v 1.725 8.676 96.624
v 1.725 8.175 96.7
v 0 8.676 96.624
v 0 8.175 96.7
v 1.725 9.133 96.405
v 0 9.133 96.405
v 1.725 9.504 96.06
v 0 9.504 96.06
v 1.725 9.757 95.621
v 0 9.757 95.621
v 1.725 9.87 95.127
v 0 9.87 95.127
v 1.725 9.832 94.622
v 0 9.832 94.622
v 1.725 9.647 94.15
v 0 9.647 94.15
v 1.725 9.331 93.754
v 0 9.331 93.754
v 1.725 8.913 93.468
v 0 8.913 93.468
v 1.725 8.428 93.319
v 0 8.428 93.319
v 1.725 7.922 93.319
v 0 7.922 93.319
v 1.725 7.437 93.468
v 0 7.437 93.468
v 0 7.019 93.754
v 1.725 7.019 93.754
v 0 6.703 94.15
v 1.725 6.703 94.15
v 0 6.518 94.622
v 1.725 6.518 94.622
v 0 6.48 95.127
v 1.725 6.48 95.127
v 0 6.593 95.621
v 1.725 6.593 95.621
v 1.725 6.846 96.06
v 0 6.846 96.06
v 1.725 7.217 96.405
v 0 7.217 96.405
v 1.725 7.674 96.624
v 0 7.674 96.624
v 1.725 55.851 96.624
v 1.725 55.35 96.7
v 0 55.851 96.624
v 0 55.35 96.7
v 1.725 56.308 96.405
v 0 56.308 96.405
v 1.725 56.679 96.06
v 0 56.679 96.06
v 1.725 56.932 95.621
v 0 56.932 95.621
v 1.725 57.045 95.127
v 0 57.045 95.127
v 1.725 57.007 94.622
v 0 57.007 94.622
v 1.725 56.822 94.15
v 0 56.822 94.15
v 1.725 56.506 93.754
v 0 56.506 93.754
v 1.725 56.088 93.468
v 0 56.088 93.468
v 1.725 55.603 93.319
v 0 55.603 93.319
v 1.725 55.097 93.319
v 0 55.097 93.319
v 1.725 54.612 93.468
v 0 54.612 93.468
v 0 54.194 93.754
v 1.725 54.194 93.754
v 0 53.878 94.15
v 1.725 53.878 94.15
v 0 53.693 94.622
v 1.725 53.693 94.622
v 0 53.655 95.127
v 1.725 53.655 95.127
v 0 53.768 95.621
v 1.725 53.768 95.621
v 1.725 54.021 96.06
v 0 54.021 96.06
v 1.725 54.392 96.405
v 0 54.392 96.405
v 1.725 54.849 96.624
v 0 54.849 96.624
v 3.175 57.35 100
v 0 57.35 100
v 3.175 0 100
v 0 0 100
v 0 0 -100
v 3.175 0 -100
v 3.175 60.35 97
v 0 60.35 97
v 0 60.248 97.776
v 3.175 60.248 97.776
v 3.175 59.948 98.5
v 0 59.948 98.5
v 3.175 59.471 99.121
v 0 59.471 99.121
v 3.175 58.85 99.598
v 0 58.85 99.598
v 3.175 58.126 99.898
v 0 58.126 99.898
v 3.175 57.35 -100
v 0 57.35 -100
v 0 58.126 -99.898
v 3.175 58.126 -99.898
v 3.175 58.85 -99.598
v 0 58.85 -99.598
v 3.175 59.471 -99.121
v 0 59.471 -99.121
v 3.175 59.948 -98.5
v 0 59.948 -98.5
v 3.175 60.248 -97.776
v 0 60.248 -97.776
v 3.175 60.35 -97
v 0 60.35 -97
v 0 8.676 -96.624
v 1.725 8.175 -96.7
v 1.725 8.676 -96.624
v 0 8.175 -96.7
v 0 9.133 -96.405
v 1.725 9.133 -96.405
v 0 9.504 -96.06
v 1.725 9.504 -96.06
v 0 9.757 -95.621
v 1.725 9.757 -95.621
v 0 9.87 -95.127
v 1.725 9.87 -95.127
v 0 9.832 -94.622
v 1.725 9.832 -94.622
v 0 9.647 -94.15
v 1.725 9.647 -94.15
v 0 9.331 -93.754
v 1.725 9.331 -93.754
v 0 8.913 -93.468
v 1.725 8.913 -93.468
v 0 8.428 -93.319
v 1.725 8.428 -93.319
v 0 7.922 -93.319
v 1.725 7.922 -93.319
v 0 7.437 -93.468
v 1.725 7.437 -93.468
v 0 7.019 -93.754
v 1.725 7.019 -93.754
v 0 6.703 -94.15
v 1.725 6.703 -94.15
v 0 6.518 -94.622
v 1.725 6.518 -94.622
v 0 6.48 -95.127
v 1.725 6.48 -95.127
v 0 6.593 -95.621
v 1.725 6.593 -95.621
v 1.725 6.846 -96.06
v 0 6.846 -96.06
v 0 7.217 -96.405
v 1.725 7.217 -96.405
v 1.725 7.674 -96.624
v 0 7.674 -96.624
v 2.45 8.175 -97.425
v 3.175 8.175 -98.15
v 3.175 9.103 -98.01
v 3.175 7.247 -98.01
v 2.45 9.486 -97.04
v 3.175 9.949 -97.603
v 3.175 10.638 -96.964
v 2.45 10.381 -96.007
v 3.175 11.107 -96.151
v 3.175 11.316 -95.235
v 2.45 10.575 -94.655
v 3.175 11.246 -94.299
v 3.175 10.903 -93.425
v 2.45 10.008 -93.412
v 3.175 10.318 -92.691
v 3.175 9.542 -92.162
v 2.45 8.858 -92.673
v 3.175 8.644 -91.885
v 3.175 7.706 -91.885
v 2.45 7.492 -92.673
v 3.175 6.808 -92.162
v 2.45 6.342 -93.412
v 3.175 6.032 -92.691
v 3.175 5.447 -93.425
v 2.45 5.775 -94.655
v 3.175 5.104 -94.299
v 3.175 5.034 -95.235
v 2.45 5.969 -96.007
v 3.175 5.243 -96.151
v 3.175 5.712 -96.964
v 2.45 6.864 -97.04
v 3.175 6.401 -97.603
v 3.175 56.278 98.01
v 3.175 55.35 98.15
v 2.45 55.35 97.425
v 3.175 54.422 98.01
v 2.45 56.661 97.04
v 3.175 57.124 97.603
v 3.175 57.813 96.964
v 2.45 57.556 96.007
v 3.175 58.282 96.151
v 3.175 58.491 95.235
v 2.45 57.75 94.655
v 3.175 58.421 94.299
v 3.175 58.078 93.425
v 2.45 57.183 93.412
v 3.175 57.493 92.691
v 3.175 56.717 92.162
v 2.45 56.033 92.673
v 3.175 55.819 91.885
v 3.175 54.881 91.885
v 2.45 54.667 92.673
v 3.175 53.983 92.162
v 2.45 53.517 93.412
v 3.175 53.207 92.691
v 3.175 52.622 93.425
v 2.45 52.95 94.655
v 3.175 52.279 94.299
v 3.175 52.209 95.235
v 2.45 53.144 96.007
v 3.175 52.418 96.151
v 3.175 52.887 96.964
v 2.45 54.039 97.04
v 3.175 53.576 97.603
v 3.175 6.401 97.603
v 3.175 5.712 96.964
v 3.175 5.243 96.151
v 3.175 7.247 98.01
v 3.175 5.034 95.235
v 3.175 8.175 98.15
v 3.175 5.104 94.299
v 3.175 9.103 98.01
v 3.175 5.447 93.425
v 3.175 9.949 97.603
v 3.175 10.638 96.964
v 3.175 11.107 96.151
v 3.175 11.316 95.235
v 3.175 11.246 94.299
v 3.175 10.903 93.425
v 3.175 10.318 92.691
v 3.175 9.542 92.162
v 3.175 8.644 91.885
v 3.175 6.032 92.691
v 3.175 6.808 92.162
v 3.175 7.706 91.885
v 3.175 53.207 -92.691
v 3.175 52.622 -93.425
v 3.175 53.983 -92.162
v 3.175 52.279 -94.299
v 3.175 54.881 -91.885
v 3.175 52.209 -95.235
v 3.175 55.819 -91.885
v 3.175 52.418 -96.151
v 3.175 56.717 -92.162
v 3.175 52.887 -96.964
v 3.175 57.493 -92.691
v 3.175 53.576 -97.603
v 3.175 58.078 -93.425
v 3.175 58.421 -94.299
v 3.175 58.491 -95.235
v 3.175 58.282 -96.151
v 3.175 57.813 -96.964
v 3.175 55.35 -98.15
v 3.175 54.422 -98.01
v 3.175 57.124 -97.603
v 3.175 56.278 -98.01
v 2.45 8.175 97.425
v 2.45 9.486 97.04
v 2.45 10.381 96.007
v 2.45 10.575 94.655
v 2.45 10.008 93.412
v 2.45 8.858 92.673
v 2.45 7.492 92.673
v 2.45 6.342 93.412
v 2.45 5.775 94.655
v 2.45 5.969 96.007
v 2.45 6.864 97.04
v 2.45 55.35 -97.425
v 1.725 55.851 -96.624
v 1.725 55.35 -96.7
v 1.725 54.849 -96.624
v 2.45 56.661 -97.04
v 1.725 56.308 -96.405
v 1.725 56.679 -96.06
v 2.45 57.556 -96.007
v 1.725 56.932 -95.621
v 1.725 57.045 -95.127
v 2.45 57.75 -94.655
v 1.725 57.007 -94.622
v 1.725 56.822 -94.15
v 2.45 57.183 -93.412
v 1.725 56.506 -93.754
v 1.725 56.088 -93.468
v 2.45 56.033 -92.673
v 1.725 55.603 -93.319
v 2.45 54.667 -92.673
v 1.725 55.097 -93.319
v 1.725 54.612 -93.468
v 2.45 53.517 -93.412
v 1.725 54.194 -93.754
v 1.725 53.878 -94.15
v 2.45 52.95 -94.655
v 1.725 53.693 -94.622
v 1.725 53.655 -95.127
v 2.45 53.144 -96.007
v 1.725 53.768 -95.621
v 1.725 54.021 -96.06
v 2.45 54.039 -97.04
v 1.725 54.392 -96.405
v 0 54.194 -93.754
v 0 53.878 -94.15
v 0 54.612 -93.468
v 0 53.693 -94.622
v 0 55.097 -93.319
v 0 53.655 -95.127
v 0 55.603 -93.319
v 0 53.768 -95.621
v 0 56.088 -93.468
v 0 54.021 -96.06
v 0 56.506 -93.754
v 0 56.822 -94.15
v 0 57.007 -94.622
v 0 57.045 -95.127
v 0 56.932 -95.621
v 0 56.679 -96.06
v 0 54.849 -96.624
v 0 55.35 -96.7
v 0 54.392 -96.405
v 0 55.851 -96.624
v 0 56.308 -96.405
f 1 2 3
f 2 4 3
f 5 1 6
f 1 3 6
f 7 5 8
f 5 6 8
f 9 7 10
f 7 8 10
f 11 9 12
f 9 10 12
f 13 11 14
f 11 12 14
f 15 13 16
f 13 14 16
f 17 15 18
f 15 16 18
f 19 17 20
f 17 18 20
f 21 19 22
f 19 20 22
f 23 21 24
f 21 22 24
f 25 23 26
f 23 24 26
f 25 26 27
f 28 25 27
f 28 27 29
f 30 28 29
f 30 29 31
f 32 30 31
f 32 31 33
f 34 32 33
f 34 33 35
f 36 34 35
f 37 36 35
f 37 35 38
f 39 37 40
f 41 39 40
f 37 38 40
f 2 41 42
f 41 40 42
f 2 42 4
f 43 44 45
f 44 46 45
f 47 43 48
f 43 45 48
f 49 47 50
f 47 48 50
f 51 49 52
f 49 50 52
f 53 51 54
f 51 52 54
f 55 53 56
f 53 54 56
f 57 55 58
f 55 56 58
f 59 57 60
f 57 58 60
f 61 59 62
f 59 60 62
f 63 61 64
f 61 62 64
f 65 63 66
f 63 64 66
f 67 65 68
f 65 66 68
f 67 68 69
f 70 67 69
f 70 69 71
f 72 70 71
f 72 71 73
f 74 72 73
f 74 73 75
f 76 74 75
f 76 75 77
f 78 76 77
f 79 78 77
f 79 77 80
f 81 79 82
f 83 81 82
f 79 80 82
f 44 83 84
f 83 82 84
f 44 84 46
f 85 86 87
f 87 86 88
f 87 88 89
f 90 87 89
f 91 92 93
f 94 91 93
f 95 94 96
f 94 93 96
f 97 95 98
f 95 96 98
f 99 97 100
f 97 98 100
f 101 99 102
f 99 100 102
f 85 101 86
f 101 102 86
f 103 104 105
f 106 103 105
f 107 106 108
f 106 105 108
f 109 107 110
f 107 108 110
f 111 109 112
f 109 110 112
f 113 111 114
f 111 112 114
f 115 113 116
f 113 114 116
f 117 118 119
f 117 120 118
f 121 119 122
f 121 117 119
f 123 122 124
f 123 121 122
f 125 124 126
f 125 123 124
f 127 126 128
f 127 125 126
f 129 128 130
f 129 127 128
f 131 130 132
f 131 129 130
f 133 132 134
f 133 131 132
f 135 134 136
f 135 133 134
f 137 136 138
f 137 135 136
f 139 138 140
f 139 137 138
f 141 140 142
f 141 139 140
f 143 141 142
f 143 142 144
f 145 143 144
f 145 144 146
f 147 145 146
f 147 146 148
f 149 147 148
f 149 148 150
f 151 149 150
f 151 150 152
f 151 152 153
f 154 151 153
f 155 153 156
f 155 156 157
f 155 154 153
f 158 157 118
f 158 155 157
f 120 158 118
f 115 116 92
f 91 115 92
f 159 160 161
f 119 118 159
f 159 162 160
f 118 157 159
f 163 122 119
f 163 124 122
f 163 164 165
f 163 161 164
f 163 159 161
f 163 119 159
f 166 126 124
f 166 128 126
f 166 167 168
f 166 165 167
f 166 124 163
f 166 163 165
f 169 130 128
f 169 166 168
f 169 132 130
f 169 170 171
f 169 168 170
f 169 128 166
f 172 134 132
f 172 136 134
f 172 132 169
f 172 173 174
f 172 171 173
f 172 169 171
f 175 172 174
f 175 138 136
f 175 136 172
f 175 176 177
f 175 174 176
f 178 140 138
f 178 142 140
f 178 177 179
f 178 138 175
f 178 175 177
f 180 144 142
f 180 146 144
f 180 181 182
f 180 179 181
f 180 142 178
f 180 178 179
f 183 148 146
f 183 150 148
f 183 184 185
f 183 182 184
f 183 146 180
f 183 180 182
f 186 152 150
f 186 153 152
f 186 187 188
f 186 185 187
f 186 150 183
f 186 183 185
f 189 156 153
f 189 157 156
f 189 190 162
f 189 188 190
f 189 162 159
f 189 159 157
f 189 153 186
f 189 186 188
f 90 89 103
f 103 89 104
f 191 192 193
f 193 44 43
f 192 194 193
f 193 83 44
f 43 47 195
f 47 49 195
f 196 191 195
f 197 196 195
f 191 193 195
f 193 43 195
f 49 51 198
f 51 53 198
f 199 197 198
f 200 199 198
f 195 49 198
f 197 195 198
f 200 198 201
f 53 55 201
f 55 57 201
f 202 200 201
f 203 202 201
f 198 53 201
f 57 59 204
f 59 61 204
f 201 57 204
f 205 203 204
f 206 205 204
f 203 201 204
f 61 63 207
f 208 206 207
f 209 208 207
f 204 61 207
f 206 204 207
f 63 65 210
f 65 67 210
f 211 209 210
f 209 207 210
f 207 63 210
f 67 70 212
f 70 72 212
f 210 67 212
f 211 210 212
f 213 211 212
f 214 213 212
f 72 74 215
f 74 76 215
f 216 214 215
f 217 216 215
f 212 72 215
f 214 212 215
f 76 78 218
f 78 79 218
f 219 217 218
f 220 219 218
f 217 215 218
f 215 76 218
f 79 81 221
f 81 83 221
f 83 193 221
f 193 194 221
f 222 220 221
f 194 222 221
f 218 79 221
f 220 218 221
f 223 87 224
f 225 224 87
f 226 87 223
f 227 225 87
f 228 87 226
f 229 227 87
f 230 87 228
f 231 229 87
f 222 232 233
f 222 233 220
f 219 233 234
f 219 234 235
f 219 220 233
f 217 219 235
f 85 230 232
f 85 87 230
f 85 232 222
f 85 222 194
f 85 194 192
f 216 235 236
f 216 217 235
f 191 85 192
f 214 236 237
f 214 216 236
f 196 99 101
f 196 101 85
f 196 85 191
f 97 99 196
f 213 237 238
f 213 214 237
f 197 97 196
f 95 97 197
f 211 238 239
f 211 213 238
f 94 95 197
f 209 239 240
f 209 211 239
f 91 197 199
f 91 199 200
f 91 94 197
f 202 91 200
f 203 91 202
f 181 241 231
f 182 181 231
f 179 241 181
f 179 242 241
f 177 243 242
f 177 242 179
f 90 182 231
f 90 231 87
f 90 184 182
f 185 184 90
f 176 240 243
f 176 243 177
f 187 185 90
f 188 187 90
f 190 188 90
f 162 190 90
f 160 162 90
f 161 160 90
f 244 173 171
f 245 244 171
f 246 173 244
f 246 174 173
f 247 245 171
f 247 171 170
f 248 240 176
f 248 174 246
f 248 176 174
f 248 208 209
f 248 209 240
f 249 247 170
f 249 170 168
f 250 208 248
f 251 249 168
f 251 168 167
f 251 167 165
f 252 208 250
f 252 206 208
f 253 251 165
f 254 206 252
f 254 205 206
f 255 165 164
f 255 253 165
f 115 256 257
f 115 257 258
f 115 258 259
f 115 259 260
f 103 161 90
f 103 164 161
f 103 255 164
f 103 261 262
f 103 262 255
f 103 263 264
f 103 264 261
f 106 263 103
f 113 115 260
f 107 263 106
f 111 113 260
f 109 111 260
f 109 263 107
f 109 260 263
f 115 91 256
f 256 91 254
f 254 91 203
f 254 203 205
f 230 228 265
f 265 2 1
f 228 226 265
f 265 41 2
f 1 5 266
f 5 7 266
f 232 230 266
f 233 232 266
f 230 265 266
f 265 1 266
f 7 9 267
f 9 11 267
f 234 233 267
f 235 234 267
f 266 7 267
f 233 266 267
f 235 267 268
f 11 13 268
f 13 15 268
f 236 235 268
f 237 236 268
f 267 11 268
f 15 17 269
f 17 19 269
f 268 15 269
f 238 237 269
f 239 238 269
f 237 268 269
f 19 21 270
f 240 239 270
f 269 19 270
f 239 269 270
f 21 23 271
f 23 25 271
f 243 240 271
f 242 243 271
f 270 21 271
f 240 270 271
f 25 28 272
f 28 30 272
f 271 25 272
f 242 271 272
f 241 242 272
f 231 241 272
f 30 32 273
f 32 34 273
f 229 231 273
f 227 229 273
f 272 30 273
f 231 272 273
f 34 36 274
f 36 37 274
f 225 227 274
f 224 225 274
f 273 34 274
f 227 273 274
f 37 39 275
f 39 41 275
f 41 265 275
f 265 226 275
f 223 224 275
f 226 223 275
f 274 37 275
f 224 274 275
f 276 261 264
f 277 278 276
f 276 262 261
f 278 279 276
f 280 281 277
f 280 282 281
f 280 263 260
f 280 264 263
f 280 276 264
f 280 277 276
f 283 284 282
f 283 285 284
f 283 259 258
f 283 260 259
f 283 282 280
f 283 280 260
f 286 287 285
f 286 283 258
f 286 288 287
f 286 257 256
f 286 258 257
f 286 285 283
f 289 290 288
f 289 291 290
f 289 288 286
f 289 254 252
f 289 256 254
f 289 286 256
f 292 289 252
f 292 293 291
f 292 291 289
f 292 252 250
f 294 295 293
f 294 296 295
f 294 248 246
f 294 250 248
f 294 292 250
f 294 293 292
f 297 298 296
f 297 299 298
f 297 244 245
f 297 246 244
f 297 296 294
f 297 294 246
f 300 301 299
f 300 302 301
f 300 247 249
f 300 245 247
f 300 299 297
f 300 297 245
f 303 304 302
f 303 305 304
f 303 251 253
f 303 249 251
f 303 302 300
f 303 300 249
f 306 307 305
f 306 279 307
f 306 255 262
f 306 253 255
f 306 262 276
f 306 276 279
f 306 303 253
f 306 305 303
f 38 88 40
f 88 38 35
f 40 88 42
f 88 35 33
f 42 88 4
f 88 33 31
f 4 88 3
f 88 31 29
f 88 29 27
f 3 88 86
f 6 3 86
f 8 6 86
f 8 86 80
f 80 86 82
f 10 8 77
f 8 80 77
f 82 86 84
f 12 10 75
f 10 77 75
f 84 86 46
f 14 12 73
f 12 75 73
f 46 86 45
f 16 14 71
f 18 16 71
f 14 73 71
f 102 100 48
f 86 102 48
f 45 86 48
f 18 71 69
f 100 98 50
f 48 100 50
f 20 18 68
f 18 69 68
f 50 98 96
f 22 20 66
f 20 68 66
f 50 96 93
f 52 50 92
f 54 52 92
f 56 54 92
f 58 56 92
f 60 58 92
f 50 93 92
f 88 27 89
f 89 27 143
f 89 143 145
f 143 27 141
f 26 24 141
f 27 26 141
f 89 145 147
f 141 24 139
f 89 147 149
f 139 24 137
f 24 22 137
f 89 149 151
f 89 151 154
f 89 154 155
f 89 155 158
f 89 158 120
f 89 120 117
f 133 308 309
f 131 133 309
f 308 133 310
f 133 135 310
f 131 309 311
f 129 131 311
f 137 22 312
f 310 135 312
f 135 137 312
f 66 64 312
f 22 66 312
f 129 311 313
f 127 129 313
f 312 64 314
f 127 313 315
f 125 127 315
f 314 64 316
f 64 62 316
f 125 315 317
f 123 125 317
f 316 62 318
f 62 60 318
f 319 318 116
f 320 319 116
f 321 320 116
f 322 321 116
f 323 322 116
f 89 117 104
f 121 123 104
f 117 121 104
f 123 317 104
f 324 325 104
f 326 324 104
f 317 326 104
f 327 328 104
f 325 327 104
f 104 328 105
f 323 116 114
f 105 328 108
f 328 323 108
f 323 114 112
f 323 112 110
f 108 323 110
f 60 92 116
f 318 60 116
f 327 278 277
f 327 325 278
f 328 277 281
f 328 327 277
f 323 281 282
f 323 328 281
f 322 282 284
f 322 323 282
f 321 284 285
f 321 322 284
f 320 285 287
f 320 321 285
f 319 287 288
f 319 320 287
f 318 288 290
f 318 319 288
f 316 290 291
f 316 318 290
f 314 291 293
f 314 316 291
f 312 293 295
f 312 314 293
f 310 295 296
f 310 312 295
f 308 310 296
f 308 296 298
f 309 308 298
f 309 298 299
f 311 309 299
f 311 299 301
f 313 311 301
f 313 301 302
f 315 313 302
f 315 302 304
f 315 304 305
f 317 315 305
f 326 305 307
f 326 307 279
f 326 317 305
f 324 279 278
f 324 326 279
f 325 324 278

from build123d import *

# Parameters (mm, degrees)
BOSS_EXTRUDE1_DEPTH                             = 3.175
CSK_FOR_M3_FLAT_HEAD_MACHINE_SCREW1_D           = 3.4
CSK_FOR_M3_FLAT_HEAD_MACHINE_SCREW1_CSINK_D     = 6.3
CSK_FOR_M3_FLAT_HEAD_MACHINE_SCREW1_CSINK_ANGLE = 90


with BuildPart() as part:
    # Sketch1 → Boss-Extrude1 (new body)
    with BuildSketch(Plane(origin=(0, 0, 0), x_dir=(0, 0, -1), z_dir=(1, 0, 0))):
        with BuildLine():
            Line((-100, 0), (100, 0))
            Line((100, 0), (100, 57.35))
            ThreePointArc((100, 57.35), (99.121320344, 59.471320344), (97, 60.35))
            Line((97, 60.35), (-97, 60.35))
            ThreePointArc((-97, 60.35), (-99.121320344, 59.471320344), (-100, 57.35))
            Line((-100, 57.35), (-100, 0))
        make_face()
    extrude(amount=BOSS_EXTRUDE1_DEPTH)

    # CSK for M3 Flat Head Machine Screw1 (through all)
    with Locations(Plane(origin=(3.175, 0, 0), x_dir=(0, 0, -1), z_dir=(1, 0, 0))):
        with Locations((-95, 8.175), (-95, 55.35)):
            csk_for_m3_flat_head_machine_screw1 = CounterSinkHole(CSK_FOR_M3_FLAT_HEAD_MACHINE_SCREW1_D / 2, CSK_FOR_M3_FLAT_HEAD_MACHINE_SCREW1_CSINK_D / 2, counter_sink_angle=CSK_FOR_M3_FLAT_HEAD_MACHINE_SCREW1_CSINK_ANGLE)

    # Mirror1: CSK for M3 Flat Head Machine Screw1 across plane
    add(csk_for_m3_flat_head_machine_screw1.mirror(Plane.XY), mode=Mode.SUBTRACT)


solid = part.part
